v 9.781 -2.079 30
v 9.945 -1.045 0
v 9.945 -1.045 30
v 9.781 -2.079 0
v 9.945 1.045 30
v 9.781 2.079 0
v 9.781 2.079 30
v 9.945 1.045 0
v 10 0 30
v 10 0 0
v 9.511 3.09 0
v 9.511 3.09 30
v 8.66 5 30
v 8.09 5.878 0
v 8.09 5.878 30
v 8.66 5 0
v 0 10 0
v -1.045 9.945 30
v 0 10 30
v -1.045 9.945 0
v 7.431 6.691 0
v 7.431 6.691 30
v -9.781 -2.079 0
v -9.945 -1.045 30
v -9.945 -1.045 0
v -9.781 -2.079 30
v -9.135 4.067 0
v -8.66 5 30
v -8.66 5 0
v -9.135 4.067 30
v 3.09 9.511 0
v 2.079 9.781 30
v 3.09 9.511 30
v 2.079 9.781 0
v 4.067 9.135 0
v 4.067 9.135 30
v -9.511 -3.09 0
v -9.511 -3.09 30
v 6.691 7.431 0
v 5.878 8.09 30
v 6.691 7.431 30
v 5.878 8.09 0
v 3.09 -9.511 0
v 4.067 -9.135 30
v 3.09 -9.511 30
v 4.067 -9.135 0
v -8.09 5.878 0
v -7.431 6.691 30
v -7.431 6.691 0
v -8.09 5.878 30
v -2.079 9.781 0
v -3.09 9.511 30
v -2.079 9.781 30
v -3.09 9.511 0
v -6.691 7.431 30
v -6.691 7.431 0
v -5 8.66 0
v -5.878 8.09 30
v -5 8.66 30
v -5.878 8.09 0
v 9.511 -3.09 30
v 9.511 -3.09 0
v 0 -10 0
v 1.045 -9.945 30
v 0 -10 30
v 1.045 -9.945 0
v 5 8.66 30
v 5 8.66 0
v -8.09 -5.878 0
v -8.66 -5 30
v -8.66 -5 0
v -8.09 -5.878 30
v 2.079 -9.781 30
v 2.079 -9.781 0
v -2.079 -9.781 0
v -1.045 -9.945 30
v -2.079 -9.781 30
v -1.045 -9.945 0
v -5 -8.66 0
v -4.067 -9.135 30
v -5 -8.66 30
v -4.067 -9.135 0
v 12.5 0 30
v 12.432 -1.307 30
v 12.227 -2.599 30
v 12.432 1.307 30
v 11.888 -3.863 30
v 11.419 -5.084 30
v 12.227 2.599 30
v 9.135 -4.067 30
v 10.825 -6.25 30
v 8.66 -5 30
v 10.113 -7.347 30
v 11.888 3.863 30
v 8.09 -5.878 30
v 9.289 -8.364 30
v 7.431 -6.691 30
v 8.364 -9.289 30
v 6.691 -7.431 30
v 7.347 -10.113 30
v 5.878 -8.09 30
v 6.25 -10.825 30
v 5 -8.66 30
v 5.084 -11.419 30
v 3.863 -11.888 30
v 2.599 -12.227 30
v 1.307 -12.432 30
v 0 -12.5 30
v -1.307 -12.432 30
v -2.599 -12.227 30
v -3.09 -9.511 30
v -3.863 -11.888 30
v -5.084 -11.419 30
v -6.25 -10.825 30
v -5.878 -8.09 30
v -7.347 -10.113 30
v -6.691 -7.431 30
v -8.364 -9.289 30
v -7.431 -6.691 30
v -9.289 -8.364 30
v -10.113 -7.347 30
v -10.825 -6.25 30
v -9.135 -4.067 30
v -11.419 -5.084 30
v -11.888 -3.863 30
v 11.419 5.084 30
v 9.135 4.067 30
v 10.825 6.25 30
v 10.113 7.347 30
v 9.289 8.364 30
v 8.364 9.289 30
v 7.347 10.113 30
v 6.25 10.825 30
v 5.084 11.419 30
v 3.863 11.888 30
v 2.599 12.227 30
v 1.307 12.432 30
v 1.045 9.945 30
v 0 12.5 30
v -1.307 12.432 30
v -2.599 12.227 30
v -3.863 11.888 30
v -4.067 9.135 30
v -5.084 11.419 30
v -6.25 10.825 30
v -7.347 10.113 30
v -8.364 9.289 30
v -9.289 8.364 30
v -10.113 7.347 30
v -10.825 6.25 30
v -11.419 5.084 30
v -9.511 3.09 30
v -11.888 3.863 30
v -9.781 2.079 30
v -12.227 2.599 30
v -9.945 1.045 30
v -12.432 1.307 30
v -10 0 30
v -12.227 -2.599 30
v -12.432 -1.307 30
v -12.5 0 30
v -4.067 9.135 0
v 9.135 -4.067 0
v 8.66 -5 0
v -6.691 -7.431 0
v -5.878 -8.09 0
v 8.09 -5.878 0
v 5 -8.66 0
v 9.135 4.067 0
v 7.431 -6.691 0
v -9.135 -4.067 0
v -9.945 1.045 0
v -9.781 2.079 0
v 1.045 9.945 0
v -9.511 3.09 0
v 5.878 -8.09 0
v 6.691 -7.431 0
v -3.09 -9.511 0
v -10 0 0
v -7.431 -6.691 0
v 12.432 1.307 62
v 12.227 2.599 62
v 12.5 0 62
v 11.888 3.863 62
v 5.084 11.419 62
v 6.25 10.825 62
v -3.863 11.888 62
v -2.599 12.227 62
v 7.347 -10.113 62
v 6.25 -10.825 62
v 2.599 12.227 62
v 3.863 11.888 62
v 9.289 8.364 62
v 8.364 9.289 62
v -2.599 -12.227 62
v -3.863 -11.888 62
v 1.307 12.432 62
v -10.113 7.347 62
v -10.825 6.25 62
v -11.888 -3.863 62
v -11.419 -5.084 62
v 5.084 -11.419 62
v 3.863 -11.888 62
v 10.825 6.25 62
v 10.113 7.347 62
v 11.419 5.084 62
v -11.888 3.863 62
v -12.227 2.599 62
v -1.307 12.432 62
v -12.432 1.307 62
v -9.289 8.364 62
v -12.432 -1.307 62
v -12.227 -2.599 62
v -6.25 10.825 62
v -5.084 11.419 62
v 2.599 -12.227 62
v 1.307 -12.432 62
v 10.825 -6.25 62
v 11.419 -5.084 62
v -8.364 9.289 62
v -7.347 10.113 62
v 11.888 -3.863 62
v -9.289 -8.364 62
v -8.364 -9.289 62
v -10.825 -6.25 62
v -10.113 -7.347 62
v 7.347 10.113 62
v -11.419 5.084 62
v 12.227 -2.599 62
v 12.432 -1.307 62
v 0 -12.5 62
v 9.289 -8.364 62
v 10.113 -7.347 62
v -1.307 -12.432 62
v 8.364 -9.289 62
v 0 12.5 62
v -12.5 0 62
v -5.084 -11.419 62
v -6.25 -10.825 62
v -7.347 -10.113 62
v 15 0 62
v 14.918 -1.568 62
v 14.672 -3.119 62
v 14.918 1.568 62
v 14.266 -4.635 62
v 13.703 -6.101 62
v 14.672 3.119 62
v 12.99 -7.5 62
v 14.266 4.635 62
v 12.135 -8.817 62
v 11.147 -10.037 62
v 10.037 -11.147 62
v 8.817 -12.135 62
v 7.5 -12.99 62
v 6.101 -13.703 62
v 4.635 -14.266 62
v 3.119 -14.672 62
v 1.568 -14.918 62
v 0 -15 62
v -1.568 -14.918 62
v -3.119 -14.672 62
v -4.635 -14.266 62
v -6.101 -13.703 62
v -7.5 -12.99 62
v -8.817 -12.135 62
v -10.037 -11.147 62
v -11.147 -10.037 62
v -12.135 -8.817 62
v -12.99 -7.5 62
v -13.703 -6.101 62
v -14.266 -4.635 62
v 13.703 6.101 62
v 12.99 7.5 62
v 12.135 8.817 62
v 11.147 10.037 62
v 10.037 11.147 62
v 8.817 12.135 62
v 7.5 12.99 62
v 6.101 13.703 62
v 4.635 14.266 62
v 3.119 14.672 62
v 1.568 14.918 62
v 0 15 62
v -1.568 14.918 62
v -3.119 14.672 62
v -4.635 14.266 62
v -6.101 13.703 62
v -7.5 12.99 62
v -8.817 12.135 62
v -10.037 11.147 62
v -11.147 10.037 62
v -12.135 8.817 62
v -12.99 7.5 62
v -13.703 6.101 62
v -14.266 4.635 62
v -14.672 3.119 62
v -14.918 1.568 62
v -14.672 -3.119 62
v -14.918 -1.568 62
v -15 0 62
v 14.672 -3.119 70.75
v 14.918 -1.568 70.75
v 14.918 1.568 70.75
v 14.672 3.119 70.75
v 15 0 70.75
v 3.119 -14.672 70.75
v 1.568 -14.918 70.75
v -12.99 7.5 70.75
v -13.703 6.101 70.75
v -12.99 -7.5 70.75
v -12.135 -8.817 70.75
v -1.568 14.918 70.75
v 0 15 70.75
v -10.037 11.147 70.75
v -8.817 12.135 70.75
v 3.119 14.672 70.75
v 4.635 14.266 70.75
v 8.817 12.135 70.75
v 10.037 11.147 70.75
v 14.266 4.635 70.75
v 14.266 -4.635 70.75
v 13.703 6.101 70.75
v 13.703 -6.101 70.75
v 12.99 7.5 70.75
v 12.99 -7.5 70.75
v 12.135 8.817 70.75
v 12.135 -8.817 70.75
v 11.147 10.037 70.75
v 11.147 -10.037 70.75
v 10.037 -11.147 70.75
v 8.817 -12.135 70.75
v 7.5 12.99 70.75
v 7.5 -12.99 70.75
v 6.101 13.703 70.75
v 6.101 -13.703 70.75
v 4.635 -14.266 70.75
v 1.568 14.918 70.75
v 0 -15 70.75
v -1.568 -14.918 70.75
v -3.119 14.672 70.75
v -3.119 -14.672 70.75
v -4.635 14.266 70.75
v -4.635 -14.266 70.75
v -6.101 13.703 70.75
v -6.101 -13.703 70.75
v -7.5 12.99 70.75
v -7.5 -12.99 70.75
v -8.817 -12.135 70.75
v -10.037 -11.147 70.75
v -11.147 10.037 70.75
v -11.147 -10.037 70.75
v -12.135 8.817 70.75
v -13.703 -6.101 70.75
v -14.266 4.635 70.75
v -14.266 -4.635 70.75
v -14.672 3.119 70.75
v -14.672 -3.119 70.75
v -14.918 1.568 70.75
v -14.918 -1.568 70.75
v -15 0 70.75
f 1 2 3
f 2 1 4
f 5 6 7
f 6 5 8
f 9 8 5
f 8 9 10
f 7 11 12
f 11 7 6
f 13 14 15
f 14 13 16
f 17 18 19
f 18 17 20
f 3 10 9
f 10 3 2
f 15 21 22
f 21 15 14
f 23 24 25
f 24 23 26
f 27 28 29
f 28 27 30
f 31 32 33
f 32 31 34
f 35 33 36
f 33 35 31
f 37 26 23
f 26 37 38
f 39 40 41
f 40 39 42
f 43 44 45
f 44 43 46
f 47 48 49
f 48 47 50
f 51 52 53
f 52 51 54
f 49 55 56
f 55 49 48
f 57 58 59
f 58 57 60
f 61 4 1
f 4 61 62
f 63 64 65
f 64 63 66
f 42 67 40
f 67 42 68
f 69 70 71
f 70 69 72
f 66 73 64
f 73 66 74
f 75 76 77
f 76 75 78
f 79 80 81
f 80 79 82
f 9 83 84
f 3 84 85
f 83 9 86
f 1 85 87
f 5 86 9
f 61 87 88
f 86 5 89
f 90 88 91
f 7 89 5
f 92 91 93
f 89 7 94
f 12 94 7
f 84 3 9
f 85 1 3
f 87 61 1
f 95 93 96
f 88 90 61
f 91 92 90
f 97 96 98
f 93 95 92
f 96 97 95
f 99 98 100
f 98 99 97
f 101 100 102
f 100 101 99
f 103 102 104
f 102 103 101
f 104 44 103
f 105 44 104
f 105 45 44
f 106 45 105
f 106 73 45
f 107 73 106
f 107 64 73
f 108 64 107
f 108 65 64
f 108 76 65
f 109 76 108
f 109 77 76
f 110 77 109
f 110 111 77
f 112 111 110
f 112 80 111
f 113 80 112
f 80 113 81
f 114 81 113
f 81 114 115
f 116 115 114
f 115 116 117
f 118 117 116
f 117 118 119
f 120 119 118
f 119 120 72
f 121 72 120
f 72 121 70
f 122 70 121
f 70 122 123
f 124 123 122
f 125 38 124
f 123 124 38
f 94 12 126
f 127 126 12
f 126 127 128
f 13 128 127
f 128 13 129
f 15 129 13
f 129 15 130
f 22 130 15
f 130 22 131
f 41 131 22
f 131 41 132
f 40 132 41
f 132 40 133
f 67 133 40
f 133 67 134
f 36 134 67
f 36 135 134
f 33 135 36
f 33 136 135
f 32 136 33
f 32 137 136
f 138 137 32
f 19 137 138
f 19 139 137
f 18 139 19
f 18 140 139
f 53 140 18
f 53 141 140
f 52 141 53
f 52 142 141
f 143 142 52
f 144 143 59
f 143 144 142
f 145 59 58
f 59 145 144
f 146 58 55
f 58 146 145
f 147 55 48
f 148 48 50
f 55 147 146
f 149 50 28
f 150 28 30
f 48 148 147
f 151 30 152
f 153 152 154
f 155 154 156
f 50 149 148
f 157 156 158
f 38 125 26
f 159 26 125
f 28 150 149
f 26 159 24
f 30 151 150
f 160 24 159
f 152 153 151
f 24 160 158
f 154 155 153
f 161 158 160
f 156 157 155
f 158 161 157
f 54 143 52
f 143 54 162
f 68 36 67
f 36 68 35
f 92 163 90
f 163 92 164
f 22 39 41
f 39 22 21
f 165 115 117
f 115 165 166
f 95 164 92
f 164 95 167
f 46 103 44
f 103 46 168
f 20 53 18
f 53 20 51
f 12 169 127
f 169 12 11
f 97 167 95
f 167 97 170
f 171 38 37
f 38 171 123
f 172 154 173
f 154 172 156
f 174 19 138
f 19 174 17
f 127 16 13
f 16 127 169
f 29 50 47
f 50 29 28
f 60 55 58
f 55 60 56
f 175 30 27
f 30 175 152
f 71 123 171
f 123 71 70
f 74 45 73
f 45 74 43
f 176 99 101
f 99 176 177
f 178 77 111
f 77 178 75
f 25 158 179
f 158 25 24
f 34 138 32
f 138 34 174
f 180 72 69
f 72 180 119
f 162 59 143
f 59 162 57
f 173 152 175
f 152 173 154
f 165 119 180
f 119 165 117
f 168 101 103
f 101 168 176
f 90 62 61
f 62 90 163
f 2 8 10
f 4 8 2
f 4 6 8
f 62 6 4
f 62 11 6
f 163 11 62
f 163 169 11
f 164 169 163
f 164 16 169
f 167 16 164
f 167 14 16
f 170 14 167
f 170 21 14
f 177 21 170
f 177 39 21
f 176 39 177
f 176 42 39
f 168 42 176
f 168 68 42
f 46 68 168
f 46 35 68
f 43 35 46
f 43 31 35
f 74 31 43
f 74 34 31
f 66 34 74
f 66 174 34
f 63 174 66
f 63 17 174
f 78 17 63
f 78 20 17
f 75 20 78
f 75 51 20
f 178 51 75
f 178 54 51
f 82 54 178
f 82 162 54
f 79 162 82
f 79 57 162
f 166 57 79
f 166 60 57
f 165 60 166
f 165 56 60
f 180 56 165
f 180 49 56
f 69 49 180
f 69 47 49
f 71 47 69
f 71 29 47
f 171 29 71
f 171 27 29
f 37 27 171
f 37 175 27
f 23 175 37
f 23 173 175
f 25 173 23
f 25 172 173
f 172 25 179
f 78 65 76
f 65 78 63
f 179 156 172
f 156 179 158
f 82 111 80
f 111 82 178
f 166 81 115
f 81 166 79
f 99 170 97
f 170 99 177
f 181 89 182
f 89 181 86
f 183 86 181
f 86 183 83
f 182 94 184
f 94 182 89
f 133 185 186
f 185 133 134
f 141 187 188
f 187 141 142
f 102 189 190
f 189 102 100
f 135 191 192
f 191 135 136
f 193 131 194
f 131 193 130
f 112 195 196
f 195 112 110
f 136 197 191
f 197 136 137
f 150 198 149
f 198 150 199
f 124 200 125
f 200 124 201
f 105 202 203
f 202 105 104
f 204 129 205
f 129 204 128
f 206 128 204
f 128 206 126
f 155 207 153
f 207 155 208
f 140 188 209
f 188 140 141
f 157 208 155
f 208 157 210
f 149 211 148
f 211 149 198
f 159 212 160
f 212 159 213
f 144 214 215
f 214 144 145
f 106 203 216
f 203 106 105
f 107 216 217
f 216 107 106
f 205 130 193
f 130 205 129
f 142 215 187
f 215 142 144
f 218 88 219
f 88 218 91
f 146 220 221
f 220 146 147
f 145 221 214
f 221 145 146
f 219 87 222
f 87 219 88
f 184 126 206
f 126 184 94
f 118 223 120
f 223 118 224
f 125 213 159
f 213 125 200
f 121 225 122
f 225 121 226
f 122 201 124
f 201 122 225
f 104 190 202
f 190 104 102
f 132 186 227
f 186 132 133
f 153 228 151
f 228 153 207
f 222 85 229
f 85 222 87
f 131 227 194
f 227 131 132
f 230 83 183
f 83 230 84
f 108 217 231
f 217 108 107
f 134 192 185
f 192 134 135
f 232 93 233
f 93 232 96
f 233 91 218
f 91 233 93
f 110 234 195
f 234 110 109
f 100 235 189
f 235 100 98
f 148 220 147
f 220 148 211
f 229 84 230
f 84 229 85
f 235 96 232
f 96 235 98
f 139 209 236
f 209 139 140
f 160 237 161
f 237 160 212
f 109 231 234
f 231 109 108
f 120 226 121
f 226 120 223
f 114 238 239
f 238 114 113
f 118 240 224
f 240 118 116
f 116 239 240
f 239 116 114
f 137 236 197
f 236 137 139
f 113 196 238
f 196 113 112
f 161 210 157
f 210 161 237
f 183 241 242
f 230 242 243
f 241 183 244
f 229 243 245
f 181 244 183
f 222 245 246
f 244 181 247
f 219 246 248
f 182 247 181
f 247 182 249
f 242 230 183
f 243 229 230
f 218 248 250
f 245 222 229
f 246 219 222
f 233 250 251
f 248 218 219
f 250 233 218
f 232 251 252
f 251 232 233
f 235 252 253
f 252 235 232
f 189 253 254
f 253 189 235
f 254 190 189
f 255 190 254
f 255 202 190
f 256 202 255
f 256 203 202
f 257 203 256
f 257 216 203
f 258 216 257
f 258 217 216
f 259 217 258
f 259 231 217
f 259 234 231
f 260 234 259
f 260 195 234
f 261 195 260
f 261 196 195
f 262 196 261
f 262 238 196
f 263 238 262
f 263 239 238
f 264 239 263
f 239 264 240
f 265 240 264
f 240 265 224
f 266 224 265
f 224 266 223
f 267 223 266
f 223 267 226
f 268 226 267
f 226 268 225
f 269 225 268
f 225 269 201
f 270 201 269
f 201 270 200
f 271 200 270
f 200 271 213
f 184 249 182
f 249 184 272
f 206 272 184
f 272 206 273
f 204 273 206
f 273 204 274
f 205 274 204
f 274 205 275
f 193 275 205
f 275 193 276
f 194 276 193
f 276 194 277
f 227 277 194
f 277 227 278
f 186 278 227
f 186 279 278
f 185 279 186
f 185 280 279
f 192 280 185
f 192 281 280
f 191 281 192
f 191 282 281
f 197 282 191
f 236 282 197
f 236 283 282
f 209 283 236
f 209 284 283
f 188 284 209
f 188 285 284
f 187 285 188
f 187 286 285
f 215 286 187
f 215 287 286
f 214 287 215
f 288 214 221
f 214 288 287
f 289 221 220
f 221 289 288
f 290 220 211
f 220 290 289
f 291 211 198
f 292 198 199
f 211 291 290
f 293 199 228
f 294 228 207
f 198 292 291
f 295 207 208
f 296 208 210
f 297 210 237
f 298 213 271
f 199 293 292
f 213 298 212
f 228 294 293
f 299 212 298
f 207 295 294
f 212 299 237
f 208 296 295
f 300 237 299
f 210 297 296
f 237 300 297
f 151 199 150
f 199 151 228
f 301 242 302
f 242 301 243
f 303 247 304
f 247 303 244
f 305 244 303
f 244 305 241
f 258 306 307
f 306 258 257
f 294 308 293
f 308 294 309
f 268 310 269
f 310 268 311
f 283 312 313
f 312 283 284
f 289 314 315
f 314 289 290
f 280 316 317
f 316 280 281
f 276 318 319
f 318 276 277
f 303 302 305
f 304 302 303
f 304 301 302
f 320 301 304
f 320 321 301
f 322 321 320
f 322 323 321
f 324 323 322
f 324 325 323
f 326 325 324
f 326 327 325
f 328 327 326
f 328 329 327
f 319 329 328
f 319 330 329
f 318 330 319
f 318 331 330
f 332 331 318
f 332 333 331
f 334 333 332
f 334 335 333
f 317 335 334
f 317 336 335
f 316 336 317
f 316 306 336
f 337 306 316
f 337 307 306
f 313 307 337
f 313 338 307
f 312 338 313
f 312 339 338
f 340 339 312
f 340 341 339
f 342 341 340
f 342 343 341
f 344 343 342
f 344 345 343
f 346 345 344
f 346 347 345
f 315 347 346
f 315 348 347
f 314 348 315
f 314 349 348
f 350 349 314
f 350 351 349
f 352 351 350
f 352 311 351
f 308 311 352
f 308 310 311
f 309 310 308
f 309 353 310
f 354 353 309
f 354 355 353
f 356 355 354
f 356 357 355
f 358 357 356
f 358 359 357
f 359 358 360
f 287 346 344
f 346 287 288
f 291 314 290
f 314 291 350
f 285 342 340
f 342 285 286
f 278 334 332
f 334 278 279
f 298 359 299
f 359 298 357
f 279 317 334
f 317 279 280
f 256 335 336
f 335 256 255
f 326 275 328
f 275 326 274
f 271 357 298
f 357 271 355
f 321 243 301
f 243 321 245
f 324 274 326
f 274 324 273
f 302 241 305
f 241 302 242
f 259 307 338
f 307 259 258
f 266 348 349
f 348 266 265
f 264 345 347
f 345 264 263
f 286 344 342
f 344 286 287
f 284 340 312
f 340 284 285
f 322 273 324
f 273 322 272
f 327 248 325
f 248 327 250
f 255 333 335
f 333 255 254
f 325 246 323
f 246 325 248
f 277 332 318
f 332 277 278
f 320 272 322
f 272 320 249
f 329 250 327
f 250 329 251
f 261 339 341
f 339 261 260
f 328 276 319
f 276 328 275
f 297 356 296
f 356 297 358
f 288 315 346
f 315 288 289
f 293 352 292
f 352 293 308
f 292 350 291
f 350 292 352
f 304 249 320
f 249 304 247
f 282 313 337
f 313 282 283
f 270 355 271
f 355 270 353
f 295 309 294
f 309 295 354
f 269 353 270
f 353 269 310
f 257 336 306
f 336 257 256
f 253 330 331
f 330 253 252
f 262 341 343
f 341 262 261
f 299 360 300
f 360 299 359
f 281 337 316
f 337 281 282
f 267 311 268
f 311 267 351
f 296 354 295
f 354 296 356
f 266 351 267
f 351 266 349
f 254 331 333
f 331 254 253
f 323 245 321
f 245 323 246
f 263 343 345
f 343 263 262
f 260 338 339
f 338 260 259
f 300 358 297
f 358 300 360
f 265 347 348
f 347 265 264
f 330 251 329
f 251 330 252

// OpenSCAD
// Shoulder bolt.
$fn = 60;
eps = 0.02;
thread_d = 20;
shoulder_d = 25;
shoulder_l = 32;
thread_l = 30;
head_d = shoulder_d + 5;
union() {
    cylinder(d=thread_d,h=thread_l);
    translate([0,0,thread_l]) cylinder(d=shoulder_d,h=shoulder_l);
    translate([0,0,thread_l+shoulder_l]) cylinder(d=head_d,h=shoulder_d*0.35);
}
